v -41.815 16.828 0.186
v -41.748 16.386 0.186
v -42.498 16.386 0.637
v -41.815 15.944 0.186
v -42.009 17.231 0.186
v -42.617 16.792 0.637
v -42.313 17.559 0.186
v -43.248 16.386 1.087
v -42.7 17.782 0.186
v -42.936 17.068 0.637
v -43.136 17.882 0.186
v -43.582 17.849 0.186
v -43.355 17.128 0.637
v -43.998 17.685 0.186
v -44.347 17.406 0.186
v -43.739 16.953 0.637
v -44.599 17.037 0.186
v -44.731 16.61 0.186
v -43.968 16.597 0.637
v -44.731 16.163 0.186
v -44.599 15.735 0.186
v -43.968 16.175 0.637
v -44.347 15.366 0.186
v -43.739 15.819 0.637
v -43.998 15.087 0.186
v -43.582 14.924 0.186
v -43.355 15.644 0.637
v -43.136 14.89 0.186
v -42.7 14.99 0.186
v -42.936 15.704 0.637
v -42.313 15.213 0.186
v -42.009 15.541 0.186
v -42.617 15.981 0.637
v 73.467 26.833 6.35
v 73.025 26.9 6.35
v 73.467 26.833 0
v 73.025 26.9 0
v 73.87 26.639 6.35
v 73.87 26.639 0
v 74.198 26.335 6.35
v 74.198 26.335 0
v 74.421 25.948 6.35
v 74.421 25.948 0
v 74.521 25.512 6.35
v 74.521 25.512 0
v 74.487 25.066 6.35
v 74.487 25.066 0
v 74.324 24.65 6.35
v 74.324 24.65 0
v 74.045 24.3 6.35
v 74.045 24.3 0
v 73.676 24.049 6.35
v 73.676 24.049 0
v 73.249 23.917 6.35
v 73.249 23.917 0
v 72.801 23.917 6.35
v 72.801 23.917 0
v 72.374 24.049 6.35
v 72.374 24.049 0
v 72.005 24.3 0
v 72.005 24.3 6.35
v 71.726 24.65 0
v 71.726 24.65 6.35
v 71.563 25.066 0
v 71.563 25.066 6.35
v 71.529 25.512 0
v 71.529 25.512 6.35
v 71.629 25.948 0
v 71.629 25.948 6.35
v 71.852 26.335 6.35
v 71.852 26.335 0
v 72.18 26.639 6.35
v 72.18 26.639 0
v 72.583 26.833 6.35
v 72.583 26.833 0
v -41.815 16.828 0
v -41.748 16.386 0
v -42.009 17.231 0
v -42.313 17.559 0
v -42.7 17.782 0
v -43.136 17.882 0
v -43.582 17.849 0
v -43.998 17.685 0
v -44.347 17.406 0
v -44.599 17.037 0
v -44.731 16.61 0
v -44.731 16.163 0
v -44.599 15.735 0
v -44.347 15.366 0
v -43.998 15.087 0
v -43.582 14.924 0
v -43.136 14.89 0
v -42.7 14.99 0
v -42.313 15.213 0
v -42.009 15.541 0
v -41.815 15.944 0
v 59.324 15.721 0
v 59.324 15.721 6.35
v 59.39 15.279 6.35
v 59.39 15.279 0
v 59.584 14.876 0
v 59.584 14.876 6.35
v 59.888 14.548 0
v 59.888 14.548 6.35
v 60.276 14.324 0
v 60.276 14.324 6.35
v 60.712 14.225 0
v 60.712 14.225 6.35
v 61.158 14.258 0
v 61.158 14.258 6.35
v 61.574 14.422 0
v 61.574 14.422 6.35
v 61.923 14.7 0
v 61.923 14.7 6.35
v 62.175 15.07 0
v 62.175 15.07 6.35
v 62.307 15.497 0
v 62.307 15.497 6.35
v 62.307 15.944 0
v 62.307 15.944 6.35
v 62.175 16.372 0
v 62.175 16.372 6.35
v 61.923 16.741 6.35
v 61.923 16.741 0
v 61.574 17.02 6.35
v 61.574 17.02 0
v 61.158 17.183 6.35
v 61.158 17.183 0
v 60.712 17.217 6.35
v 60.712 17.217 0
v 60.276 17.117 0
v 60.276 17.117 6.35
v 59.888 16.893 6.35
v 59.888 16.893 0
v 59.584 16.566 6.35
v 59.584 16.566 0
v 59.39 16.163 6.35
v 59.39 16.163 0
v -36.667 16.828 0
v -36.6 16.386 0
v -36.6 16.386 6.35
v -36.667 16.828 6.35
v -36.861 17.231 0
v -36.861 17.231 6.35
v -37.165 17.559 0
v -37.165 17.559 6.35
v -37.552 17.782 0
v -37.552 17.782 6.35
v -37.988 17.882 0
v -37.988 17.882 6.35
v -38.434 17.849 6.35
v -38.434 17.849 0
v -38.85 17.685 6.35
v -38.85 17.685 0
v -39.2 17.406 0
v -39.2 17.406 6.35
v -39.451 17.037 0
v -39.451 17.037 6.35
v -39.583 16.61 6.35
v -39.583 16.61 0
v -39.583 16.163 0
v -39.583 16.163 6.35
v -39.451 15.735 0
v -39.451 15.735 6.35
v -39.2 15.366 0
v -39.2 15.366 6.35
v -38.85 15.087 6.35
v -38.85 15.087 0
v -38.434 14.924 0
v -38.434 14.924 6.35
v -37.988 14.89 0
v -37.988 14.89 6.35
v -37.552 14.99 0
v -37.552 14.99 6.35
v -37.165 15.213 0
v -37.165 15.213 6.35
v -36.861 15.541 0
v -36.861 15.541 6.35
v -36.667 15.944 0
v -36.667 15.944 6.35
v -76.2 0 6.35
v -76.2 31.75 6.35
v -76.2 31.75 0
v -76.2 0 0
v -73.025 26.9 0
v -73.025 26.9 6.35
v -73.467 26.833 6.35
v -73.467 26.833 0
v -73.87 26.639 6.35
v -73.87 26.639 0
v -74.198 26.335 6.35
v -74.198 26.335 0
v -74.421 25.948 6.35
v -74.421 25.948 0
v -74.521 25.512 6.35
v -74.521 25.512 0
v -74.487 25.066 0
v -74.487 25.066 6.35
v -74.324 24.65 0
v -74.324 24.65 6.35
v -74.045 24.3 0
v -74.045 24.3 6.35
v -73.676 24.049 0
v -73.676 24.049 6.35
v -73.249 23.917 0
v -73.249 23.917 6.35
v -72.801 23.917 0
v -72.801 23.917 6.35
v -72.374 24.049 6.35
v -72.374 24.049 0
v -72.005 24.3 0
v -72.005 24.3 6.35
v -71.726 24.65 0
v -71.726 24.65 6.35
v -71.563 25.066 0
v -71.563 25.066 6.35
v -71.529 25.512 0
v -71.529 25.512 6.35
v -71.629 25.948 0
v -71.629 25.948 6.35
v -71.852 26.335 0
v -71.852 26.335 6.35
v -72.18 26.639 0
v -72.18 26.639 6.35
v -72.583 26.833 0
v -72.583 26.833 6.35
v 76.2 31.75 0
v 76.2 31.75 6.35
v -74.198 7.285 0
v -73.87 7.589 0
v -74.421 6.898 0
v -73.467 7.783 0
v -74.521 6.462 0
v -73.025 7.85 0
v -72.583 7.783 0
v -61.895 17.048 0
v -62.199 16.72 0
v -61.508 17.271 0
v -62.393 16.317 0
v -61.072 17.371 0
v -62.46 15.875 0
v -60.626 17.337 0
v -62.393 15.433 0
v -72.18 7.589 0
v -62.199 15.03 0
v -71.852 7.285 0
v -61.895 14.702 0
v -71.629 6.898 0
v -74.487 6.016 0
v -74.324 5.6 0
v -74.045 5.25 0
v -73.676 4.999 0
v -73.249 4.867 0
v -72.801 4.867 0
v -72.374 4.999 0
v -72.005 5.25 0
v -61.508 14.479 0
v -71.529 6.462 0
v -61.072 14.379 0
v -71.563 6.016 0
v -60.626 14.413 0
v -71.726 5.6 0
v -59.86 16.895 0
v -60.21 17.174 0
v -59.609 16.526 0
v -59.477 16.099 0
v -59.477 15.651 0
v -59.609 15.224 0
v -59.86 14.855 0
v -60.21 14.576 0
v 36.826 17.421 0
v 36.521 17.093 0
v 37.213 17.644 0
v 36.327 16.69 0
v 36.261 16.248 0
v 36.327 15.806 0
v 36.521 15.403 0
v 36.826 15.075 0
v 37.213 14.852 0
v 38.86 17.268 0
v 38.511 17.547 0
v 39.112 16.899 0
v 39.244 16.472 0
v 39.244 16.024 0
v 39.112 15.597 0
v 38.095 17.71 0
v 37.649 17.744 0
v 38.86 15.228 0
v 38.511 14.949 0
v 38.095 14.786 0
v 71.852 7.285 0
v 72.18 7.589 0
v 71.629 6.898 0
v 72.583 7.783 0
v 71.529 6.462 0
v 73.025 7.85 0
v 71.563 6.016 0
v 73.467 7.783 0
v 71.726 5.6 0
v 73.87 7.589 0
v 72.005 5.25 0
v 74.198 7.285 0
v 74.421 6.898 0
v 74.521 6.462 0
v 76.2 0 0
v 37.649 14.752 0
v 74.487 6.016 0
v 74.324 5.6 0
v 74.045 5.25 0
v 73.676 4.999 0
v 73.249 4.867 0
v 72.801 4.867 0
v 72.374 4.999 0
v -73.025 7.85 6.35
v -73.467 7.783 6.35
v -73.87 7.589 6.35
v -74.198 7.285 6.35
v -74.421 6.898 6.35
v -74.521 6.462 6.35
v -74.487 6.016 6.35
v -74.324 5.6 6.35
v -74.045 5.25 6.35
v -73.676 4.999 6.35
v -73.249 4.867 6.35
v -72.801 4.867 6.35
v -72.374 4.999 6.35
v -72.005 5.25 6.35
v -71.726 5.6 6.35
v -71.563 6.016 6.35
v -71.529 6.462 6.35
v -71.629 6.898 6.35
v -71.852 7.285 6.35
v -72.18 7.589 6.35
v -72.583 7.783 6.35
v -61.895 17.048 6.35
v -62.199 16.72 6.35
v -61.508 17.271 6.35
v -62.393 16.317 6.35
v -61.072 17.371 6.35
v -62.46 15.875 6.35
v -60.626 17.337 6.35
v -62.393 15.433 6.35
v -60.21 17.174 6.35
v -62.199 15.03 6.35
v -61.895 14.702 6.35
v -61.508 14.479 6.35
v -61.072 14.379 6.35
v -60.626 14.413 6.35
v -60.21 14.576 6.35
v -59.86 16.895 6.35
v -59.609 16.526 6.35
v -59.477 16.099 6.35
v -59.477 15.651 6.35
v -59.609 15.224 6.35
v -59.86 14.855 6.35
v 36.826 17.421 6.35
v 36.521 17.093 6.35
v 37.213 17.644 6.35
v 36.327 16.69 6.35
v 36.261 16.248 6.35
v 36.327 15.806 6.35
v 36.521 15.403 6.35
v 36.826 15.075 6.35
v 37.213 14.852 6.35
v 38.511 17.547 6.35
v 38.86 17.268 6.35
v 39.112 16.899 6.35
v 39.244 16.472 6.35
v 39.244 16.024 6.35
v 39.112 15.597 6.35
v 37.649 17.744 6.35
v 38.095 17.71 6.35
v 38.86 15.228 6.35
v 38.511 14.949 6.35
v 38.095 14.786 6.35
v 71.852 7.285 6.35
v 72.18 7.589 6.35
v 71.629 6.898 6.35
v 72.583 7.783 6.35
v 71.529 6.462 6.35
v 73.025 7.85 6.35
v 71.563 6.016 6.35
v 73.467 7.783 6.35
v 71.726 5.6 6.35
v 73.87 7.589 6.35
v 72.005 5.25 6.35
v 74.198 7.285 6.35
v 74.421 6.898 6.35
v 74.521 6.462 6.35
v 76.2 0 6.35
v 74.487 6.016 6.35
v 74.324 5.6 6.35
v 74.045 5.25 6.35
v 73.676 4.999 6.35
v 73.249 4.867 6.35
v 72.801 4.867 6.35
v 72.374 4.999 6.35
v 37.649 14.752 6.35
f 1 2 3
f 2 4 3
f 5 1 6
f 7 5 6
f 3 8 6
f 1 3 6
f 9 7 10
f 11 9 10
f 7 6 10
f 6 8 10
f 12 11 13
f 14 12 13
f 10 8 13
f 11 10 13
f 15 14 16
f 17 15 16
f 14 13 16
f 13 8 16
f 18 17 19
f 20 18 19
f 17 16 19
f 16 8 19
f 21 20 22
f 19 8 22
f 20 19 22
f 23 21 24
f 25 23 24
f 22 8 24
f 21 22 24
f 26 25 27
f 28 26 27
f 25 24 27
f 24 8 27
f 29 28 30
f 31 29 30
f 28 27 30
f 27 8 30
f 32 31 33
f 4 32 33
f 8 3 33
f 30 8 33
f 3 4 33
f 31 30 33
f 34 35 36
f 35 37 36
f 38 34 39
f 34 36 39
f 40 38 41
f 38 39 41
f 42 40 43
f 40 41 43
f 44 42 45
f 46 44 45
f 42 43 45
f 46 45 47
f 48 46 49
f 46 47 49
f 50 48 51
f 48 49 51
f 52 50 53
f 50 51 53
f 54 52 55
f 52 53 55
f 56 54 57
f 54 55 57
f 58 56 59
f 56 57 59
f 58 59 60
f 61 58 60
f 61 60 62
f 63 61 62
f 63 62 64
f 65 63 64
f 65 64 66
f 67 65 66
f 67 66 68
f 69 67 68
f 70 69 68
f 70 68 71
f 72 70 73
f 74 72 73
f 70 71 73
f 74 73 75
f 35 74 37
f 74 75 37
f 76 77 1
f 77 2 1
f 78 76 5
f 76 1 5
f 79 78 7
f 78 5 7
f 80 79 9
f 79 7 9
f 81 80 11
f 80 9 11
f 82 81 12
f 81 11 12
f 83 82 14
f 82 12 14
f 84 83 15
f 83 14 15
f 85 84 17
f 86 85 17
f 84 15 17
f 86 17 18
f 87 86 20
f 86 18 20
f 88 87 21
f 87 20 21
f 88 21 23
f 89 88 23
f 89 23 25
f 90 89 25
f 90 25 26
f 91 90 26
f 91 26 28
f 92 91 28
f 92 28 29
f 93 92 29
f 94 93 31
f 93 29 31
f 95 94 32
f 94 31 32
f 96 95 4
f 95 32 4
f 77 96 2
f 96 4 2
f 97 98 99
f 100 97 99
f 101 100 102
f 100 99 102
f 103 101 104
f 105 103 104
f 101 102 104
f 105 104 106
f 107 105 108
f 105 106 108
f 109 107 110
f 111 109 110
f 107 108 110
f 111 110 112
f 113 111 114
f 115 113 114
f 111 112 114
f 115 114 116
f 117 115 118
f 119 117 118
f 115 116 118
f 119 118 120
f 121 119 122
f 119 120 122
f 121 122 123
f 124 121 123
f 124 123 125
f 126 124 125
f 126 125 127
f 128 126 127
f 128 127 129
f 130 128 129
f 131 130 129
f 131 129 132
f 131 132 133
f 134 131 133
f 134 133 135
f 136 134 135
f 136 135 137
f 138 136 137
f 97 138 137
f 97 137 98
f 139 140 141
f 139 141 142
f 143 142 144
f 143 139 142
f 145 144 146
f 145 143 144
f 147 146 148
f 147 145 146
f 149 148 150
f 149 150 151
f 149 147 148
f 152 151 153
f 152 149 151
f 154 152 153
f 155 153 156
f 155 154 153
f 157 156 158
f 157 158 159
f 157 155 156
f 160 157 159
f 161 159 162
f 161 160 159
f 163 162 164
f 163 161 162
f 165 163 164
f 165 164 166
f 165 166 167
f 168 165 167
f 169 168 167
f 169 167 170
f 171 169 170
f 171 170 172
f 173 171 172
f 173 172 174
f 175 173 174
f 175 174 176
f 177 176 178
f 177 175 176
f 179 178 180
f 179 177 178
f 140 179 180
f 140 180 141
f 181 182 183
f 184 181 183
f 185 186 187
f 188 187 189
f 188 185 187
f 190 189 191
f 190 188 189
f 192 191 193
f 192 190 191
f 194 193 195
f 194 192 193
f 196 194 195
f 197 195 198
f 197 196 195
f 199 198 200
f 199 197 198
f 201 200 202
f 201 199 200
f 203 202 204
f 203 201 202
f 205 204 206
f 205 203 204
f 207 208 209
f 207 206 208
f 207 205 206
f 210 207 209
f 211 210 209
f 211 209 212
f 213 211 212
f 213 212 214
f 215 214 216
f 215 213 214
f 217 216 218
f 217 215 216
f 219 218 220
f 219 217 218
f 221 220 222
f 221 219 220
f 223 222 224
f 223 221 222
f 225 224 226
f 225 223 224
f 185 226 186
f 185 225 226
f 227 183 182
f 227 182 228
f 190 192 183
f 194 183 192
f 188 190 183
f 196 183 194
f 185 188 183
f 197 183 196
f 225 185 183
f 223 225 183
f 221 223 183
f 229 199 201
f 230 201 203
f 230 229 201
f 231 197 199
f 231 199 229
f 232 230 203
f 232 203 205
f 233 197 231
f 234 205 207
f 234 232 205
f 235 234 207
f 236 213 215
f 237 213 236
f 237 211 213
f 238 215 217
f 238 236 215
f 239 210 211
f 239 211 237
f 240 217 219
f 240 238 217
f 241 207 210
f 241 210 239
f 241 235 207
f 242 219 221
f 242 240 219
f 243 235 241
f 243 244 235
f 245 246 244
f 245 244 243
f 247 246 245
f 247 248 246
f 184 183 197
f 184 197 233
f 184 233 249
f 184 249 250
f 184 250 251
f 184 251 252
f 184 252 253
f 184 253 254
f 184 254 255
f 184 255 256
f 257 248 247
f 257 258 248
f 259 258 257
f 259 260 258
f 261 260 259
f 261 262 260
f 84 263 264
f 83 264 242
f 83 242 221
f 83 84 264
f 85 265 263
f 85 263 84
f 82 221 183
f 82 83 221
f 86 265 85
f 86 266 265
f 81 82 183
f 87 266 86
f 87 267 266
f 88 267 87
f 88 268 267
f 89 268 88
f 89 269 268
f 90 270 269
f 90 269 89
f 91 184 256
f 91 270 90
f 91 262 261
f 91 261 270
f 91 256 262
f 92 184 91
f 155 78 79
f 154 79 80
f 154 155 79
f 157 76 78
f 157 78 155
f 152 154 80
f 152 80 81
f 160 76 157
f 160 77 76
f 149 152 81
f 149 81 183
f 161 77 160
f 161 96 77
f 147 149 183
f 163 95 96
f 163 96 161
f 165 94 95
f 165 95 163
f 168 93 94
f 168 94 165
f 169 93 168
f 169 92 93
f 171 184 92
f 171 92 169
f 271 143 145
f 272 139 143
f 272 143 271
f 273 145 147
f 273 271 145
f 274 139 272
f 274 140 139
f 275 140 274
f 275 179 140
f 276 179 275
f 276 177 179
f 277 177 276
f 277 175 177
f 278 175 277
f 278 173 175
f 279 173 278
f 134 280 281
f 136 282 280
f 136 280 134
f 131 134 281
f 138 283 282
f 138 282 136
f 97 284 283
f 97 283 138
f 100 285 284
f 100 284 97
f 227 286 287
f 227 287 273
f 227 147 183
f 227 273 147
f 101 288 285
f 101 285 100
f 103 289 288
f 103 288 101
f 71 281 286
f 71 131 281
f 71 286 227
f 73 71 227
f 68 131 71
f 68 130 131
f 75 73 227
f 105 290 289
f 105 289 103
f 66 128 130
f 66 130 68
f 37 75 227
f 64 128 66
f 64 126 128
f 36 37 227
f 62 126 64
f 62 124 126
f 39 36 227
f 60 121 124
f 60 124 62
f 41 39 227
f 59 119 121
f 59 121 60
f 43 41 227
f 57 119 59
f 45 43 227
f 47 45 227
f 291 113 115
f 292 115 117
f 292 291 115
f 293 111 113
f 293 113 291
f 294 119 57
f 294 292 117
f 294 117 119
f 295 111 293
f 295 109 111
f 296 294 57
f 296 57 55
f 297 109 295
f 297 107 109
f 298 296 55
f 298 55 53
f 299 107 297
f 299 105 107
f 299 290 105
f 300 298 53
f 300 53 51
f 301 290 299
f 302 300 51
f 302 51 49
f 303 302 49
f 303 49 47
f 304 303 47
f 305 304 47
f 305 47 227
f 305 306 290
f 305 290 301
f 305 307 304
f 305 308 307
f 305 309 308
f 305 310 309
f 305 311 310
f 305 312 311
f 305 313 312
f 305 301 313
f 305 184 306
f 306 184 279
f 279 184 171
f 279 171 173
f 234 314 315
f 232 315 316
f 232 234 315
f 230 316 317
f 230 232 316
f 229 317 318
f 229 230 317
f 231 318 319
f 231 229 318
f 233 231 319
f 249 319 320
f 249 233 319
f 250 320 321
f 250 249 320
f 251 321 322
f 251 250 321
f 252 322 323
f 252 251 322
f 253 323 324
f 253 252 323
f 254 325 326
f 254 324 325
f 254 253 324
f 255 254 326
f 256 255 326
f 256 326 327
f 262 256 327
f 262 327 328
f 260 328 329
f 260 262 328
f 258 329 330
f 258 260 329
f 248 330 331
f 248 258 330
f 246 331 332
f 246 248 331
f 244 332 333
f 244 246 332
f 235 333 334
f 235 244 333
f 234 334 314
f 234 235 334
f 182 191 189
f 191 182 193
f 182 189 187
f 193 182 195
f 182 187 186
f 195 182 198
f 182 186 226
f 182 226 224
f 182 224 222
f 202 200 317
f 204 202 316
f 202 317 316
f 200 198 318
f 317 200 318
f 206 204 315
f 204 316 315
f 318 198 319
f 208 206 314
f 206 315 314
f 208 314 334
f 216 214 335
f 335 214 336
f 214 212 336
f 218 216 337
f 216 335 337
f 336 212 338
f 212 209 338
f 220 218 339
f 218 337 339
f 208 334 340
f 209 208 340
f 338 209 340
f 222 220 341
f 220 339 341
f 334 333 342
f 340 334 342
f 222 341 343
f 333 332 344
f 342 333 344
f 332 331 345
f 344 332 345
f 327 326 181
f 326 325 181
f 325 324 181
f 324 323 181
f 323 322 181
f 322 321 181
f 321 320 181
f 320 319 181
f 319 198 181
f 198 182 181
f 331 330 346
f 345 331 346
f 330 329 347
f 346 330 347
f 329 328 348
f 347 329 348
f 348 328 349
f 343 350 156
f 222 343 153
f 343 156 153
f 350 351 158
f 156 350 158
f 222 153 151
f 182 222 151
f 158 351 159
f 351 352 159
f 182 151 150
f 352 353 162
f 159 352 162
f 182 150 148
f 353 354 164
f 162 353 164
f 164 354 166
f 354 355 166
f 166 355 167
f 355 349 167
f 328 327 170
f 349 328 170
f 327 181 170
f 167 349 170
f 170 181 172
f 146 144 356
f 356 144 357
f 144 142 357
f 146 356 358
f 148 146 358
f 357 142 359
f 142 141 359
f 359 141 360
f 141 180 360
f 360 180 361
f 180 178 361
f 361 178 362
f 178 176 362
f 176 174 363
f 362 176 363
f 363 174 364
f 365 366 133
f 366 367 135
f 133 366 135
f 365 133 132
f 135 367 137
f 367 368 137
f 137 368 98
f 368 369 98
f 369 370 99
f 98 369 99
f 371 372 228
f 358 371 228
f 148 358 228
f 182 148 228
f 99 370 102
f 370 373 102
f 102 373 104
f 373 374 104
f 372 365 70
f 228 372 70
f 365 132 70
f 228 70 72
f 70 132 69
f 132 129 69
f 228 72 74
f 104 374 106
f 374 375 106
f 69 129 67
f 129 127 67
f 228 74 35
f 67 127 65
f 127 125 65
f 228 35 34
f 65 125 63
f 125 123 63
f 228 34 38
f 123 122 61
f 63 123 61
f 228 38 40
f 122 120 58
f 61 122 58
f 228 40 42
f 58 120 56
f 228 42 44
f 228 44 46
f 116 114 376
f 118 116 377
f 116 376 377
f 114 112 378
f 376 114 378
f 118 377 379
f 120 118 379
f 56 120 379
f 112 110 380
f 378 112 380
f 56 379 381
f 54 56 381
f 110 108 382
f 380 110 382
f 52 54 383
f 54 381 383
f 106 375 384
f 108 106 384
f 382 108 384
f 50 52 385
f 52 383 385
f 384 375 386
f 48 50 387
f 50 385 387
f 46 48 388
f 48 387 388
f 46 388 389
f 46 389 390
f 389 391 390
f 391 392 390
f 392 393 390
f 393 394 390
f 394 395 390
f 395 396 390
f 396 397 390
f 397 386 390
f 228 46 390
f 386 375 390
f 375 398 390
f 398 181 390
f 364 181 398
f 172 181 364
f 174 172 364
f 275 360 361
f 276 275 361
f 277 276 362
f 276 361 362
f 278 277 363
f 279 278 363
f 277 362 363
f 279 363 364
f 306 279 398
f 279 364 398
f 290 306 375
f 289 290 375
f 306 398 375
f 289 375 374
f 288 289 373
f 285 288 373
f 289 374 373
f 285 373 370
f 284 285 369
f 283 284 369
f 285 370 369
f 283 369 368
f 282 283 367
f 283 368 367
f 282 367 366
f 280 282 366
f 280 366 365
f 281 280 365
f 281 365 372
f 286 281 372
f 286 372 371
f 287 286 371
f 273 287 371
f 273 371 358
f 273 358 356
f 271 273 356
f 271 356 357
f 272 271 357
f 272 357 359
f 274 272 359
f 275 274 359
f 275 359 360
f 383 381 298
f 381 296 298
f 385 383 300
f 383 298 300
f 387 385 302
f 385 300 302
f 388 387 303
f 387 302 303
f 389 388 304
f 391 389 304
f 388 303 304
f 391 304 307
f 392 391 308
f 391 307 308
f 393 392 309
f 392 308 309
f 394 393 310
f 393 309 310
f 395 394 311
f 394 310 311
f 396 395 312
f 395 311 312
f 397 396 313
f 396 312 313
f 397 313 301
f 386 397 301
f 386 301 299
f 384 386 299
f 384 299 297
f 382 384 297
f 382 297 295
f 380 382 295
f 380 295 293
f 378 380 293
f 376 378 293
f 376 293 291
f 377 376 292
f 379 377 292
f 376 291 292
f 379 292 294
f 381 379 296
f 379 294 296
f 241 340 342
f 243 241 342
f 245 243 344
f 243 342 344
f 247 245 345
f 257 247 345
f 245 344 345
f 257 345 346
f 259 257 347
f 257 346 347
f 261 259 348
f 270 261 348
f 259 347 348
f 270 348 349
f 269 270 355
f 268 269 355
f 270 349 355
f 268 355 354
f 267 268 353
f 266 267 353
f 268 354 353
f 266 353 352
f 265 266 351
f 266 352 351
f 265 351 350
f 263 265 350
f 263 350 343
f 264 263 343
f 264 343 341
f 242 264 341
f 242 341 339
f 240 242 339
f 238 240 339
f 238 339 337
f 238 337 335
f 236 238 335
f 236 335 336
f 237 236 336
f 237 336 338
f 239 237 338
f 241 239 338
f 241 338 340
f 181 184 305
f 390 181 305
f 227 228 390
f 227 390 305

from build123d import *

# Parameters (mm, degrees)
SKETCH1_W                      = 152.4
SKETCH1_H                      = 6.35
WALL_DEPTH                     = 31.75
F_3_0MM_DOWEL_HOLE2_AT_2_COUNT = 2
F_3_0MM_DOWEL_HOLE2_AT_2_PITCH = 19.05
F_3_0MM_DOWEL_HOLE1_D          = 3
F_3_0MM_DOWEL_HOLE1_DEPTH      = 12.7
F_3_0MM_DOWEL_HOLE1_TIP        = 0.901290929
F_3_0MM_DOWEL_HOLE4_D          = 3
F_3_0MM_DOWEL_HOLE4_DEPTH      = 12.7
F_3_0MM_DOWEL_HOLE4_TIP        = 0.901290929
F_3_0MM_DOWEL_HOLE5_OUTLINE_R  = 1.5
F_3_0MM_DOWEL_HOLE5_DEPTH      = 6.35


# Read off the part's stored shape, not the designer's step: Ø3.0mm Dowel Hole5, Ø3.0mm Dowel Hole6
with BuildPart() as part:
    # Sketch1 → wall (new body)
    with BuildSketch(Plane(origin=(0, 0, 0), x_dir=(1, 0, 0), z_dir=(0, 1, 0))):
        with Locations((0, -3.175)):
            Rectangle(SKETCH1_W, SKETCH1_H)
    extrude(amount=WALL_DEPTH)

    # Sketch5 → Ø3.0mm Dowel Hole2 (revolve, cut)
    with BuildSketch(Plane(origin=(-73.025, 25.4, 0), x_dir=(0, 1, 0), z_dir=(1, 0, 0))):
        Polygon((0, 0), (0, 15.901286329), (1.5, 14.9999954), (1.5, 0), align=None)
    f_3_0mm_dowel_hole2 = revolve(axis=Axis((-73.025, 25.4, -6.35), (0, 0, 1)), mode=Mode.SUBTRACT)

    # Ø3.0mm Dowel Hole2 at 2: Ø3.0mm Dowel Hole2 ×2
    with Locations(*[(0, -i * F_3_0MM_DOWEL_HOLE2_AT_2_PITCH, 0) for i in range(1, F_3_0MM_DOWEL_HOLE2_AT_2_COUNT)]):
        add(f_3_0mm_dowel_hole2, mode=Mode.SUBTRACT)

    # Mirror1: Ø3.0mm Dowel Hole2 across plane
    add(f_3_0mm_dowel_hole2.mirror(Plane(origin=(0, 0, 0), x_dir=(0, 0, 1), z_dir=(1, 0, 0))), mode=Mode.SUBTRACT)

    # Mirror1 copy 1 sketch → Mirror1 copy 1 (revolve, cut)
    with BuildSketch(Plane(origin=(73.025, 6.35, 0), x_dir=(0, 1, 0), z_dir=(-1, 0, 0))):
        Polygon((0, 0), (0, -15.901286329), (1.5, -14.9999954), (1.5, 0), align=None)
    revolve(axis=Axis((73.025, 6.35, -6.35), (0, 0, -1)), mode=Mode.SUBTRACT)

    # Ø3.0mm Dowel Hole1
    with Locations(Plane(origin=(76.2, 31.75, -2.54), x_dir=(1, 0, 0), z_dir=(0, 0, -1))):
        with Locations((-137.16, 15.875)):
            Hole(F_3_0MM_DOWEL_HOLE1_D / 2, depth=F_3_0MM_DOWEL_HOLE1_DEPTH)
            with Locations((0, 0, -(F_3_0MM_DOWEL_HOLE1_DEPTH + F_3_0MM_DOWEL_HOLE1_TIP / 2))):  # 118° drill point
                Cone(0, F_3_0MM_DOWEL_HOLE1_D / 2, F_3_0MM_DOWEL_HOLE1_TIP, mode=Mode.SUBTRACT)

    # Ø3.0mm Dowel Hole4
    with Locations(Plane(origin=(76.2, 31.75, -2.54), x_dir=(1, 0, 0), z_dir=(0, 0, -1))):
        with Locations((-38.439194916, 15.502033877), (-15.376273346, 16.029273481)):
            Hole(F_3_0MM_DOWEL_HOLE4_D / 2, depth=F_3_0MM_DOWEL_HOLE4_DEPTH)
            with Locations((0, 0, -(F_3_0MM_DOWEL_HOLE4_DEPTH + F_3_0MM_DOWEL_HOLE4_TIP / 2))):  # 118° drill point
                Cone(0, F_3_0MM_DOWEL_HOLE4_D / 2, F_3_0MM_DOWEL_HOLE4_TIP, mode=Mode.SUBTRACT)

    # Ø3.0mm Dowel Hole5 outline → Ø3.0mm Dowel Hole5 (cut)
    with BuildSketch(Plane.XY):
        with Locations((-38.1, 16.386133576)):
            Circle(F_3_0MM_DOWEL_HOLE5_OUTLINE_R)
    extrude(amount=F_3_0MM_DOWEL_HOLE5_DEPTH, mode=Mode.SUBTRACT)

    # Ø3.0mm Dowel Hole6 outline → Ø3.0mm Dowel Hole6 (revolve, cut)
    with BuildSketch(Plane(origin=(-43.247895679, 16.386133576, 0), x_dir=(1, 0, 0), z_dir=(0, -1, 0))):
        Polygon((1.5, 0.186037407), (0, 1.087328336), (0, 0), (1.5, 0), align=None)
    revolve(axis=Axis((-43.247895679, 16.386133576, 0), (0, 0, 1)), mode=Mode.SUBTRACT)


solid = part.part
